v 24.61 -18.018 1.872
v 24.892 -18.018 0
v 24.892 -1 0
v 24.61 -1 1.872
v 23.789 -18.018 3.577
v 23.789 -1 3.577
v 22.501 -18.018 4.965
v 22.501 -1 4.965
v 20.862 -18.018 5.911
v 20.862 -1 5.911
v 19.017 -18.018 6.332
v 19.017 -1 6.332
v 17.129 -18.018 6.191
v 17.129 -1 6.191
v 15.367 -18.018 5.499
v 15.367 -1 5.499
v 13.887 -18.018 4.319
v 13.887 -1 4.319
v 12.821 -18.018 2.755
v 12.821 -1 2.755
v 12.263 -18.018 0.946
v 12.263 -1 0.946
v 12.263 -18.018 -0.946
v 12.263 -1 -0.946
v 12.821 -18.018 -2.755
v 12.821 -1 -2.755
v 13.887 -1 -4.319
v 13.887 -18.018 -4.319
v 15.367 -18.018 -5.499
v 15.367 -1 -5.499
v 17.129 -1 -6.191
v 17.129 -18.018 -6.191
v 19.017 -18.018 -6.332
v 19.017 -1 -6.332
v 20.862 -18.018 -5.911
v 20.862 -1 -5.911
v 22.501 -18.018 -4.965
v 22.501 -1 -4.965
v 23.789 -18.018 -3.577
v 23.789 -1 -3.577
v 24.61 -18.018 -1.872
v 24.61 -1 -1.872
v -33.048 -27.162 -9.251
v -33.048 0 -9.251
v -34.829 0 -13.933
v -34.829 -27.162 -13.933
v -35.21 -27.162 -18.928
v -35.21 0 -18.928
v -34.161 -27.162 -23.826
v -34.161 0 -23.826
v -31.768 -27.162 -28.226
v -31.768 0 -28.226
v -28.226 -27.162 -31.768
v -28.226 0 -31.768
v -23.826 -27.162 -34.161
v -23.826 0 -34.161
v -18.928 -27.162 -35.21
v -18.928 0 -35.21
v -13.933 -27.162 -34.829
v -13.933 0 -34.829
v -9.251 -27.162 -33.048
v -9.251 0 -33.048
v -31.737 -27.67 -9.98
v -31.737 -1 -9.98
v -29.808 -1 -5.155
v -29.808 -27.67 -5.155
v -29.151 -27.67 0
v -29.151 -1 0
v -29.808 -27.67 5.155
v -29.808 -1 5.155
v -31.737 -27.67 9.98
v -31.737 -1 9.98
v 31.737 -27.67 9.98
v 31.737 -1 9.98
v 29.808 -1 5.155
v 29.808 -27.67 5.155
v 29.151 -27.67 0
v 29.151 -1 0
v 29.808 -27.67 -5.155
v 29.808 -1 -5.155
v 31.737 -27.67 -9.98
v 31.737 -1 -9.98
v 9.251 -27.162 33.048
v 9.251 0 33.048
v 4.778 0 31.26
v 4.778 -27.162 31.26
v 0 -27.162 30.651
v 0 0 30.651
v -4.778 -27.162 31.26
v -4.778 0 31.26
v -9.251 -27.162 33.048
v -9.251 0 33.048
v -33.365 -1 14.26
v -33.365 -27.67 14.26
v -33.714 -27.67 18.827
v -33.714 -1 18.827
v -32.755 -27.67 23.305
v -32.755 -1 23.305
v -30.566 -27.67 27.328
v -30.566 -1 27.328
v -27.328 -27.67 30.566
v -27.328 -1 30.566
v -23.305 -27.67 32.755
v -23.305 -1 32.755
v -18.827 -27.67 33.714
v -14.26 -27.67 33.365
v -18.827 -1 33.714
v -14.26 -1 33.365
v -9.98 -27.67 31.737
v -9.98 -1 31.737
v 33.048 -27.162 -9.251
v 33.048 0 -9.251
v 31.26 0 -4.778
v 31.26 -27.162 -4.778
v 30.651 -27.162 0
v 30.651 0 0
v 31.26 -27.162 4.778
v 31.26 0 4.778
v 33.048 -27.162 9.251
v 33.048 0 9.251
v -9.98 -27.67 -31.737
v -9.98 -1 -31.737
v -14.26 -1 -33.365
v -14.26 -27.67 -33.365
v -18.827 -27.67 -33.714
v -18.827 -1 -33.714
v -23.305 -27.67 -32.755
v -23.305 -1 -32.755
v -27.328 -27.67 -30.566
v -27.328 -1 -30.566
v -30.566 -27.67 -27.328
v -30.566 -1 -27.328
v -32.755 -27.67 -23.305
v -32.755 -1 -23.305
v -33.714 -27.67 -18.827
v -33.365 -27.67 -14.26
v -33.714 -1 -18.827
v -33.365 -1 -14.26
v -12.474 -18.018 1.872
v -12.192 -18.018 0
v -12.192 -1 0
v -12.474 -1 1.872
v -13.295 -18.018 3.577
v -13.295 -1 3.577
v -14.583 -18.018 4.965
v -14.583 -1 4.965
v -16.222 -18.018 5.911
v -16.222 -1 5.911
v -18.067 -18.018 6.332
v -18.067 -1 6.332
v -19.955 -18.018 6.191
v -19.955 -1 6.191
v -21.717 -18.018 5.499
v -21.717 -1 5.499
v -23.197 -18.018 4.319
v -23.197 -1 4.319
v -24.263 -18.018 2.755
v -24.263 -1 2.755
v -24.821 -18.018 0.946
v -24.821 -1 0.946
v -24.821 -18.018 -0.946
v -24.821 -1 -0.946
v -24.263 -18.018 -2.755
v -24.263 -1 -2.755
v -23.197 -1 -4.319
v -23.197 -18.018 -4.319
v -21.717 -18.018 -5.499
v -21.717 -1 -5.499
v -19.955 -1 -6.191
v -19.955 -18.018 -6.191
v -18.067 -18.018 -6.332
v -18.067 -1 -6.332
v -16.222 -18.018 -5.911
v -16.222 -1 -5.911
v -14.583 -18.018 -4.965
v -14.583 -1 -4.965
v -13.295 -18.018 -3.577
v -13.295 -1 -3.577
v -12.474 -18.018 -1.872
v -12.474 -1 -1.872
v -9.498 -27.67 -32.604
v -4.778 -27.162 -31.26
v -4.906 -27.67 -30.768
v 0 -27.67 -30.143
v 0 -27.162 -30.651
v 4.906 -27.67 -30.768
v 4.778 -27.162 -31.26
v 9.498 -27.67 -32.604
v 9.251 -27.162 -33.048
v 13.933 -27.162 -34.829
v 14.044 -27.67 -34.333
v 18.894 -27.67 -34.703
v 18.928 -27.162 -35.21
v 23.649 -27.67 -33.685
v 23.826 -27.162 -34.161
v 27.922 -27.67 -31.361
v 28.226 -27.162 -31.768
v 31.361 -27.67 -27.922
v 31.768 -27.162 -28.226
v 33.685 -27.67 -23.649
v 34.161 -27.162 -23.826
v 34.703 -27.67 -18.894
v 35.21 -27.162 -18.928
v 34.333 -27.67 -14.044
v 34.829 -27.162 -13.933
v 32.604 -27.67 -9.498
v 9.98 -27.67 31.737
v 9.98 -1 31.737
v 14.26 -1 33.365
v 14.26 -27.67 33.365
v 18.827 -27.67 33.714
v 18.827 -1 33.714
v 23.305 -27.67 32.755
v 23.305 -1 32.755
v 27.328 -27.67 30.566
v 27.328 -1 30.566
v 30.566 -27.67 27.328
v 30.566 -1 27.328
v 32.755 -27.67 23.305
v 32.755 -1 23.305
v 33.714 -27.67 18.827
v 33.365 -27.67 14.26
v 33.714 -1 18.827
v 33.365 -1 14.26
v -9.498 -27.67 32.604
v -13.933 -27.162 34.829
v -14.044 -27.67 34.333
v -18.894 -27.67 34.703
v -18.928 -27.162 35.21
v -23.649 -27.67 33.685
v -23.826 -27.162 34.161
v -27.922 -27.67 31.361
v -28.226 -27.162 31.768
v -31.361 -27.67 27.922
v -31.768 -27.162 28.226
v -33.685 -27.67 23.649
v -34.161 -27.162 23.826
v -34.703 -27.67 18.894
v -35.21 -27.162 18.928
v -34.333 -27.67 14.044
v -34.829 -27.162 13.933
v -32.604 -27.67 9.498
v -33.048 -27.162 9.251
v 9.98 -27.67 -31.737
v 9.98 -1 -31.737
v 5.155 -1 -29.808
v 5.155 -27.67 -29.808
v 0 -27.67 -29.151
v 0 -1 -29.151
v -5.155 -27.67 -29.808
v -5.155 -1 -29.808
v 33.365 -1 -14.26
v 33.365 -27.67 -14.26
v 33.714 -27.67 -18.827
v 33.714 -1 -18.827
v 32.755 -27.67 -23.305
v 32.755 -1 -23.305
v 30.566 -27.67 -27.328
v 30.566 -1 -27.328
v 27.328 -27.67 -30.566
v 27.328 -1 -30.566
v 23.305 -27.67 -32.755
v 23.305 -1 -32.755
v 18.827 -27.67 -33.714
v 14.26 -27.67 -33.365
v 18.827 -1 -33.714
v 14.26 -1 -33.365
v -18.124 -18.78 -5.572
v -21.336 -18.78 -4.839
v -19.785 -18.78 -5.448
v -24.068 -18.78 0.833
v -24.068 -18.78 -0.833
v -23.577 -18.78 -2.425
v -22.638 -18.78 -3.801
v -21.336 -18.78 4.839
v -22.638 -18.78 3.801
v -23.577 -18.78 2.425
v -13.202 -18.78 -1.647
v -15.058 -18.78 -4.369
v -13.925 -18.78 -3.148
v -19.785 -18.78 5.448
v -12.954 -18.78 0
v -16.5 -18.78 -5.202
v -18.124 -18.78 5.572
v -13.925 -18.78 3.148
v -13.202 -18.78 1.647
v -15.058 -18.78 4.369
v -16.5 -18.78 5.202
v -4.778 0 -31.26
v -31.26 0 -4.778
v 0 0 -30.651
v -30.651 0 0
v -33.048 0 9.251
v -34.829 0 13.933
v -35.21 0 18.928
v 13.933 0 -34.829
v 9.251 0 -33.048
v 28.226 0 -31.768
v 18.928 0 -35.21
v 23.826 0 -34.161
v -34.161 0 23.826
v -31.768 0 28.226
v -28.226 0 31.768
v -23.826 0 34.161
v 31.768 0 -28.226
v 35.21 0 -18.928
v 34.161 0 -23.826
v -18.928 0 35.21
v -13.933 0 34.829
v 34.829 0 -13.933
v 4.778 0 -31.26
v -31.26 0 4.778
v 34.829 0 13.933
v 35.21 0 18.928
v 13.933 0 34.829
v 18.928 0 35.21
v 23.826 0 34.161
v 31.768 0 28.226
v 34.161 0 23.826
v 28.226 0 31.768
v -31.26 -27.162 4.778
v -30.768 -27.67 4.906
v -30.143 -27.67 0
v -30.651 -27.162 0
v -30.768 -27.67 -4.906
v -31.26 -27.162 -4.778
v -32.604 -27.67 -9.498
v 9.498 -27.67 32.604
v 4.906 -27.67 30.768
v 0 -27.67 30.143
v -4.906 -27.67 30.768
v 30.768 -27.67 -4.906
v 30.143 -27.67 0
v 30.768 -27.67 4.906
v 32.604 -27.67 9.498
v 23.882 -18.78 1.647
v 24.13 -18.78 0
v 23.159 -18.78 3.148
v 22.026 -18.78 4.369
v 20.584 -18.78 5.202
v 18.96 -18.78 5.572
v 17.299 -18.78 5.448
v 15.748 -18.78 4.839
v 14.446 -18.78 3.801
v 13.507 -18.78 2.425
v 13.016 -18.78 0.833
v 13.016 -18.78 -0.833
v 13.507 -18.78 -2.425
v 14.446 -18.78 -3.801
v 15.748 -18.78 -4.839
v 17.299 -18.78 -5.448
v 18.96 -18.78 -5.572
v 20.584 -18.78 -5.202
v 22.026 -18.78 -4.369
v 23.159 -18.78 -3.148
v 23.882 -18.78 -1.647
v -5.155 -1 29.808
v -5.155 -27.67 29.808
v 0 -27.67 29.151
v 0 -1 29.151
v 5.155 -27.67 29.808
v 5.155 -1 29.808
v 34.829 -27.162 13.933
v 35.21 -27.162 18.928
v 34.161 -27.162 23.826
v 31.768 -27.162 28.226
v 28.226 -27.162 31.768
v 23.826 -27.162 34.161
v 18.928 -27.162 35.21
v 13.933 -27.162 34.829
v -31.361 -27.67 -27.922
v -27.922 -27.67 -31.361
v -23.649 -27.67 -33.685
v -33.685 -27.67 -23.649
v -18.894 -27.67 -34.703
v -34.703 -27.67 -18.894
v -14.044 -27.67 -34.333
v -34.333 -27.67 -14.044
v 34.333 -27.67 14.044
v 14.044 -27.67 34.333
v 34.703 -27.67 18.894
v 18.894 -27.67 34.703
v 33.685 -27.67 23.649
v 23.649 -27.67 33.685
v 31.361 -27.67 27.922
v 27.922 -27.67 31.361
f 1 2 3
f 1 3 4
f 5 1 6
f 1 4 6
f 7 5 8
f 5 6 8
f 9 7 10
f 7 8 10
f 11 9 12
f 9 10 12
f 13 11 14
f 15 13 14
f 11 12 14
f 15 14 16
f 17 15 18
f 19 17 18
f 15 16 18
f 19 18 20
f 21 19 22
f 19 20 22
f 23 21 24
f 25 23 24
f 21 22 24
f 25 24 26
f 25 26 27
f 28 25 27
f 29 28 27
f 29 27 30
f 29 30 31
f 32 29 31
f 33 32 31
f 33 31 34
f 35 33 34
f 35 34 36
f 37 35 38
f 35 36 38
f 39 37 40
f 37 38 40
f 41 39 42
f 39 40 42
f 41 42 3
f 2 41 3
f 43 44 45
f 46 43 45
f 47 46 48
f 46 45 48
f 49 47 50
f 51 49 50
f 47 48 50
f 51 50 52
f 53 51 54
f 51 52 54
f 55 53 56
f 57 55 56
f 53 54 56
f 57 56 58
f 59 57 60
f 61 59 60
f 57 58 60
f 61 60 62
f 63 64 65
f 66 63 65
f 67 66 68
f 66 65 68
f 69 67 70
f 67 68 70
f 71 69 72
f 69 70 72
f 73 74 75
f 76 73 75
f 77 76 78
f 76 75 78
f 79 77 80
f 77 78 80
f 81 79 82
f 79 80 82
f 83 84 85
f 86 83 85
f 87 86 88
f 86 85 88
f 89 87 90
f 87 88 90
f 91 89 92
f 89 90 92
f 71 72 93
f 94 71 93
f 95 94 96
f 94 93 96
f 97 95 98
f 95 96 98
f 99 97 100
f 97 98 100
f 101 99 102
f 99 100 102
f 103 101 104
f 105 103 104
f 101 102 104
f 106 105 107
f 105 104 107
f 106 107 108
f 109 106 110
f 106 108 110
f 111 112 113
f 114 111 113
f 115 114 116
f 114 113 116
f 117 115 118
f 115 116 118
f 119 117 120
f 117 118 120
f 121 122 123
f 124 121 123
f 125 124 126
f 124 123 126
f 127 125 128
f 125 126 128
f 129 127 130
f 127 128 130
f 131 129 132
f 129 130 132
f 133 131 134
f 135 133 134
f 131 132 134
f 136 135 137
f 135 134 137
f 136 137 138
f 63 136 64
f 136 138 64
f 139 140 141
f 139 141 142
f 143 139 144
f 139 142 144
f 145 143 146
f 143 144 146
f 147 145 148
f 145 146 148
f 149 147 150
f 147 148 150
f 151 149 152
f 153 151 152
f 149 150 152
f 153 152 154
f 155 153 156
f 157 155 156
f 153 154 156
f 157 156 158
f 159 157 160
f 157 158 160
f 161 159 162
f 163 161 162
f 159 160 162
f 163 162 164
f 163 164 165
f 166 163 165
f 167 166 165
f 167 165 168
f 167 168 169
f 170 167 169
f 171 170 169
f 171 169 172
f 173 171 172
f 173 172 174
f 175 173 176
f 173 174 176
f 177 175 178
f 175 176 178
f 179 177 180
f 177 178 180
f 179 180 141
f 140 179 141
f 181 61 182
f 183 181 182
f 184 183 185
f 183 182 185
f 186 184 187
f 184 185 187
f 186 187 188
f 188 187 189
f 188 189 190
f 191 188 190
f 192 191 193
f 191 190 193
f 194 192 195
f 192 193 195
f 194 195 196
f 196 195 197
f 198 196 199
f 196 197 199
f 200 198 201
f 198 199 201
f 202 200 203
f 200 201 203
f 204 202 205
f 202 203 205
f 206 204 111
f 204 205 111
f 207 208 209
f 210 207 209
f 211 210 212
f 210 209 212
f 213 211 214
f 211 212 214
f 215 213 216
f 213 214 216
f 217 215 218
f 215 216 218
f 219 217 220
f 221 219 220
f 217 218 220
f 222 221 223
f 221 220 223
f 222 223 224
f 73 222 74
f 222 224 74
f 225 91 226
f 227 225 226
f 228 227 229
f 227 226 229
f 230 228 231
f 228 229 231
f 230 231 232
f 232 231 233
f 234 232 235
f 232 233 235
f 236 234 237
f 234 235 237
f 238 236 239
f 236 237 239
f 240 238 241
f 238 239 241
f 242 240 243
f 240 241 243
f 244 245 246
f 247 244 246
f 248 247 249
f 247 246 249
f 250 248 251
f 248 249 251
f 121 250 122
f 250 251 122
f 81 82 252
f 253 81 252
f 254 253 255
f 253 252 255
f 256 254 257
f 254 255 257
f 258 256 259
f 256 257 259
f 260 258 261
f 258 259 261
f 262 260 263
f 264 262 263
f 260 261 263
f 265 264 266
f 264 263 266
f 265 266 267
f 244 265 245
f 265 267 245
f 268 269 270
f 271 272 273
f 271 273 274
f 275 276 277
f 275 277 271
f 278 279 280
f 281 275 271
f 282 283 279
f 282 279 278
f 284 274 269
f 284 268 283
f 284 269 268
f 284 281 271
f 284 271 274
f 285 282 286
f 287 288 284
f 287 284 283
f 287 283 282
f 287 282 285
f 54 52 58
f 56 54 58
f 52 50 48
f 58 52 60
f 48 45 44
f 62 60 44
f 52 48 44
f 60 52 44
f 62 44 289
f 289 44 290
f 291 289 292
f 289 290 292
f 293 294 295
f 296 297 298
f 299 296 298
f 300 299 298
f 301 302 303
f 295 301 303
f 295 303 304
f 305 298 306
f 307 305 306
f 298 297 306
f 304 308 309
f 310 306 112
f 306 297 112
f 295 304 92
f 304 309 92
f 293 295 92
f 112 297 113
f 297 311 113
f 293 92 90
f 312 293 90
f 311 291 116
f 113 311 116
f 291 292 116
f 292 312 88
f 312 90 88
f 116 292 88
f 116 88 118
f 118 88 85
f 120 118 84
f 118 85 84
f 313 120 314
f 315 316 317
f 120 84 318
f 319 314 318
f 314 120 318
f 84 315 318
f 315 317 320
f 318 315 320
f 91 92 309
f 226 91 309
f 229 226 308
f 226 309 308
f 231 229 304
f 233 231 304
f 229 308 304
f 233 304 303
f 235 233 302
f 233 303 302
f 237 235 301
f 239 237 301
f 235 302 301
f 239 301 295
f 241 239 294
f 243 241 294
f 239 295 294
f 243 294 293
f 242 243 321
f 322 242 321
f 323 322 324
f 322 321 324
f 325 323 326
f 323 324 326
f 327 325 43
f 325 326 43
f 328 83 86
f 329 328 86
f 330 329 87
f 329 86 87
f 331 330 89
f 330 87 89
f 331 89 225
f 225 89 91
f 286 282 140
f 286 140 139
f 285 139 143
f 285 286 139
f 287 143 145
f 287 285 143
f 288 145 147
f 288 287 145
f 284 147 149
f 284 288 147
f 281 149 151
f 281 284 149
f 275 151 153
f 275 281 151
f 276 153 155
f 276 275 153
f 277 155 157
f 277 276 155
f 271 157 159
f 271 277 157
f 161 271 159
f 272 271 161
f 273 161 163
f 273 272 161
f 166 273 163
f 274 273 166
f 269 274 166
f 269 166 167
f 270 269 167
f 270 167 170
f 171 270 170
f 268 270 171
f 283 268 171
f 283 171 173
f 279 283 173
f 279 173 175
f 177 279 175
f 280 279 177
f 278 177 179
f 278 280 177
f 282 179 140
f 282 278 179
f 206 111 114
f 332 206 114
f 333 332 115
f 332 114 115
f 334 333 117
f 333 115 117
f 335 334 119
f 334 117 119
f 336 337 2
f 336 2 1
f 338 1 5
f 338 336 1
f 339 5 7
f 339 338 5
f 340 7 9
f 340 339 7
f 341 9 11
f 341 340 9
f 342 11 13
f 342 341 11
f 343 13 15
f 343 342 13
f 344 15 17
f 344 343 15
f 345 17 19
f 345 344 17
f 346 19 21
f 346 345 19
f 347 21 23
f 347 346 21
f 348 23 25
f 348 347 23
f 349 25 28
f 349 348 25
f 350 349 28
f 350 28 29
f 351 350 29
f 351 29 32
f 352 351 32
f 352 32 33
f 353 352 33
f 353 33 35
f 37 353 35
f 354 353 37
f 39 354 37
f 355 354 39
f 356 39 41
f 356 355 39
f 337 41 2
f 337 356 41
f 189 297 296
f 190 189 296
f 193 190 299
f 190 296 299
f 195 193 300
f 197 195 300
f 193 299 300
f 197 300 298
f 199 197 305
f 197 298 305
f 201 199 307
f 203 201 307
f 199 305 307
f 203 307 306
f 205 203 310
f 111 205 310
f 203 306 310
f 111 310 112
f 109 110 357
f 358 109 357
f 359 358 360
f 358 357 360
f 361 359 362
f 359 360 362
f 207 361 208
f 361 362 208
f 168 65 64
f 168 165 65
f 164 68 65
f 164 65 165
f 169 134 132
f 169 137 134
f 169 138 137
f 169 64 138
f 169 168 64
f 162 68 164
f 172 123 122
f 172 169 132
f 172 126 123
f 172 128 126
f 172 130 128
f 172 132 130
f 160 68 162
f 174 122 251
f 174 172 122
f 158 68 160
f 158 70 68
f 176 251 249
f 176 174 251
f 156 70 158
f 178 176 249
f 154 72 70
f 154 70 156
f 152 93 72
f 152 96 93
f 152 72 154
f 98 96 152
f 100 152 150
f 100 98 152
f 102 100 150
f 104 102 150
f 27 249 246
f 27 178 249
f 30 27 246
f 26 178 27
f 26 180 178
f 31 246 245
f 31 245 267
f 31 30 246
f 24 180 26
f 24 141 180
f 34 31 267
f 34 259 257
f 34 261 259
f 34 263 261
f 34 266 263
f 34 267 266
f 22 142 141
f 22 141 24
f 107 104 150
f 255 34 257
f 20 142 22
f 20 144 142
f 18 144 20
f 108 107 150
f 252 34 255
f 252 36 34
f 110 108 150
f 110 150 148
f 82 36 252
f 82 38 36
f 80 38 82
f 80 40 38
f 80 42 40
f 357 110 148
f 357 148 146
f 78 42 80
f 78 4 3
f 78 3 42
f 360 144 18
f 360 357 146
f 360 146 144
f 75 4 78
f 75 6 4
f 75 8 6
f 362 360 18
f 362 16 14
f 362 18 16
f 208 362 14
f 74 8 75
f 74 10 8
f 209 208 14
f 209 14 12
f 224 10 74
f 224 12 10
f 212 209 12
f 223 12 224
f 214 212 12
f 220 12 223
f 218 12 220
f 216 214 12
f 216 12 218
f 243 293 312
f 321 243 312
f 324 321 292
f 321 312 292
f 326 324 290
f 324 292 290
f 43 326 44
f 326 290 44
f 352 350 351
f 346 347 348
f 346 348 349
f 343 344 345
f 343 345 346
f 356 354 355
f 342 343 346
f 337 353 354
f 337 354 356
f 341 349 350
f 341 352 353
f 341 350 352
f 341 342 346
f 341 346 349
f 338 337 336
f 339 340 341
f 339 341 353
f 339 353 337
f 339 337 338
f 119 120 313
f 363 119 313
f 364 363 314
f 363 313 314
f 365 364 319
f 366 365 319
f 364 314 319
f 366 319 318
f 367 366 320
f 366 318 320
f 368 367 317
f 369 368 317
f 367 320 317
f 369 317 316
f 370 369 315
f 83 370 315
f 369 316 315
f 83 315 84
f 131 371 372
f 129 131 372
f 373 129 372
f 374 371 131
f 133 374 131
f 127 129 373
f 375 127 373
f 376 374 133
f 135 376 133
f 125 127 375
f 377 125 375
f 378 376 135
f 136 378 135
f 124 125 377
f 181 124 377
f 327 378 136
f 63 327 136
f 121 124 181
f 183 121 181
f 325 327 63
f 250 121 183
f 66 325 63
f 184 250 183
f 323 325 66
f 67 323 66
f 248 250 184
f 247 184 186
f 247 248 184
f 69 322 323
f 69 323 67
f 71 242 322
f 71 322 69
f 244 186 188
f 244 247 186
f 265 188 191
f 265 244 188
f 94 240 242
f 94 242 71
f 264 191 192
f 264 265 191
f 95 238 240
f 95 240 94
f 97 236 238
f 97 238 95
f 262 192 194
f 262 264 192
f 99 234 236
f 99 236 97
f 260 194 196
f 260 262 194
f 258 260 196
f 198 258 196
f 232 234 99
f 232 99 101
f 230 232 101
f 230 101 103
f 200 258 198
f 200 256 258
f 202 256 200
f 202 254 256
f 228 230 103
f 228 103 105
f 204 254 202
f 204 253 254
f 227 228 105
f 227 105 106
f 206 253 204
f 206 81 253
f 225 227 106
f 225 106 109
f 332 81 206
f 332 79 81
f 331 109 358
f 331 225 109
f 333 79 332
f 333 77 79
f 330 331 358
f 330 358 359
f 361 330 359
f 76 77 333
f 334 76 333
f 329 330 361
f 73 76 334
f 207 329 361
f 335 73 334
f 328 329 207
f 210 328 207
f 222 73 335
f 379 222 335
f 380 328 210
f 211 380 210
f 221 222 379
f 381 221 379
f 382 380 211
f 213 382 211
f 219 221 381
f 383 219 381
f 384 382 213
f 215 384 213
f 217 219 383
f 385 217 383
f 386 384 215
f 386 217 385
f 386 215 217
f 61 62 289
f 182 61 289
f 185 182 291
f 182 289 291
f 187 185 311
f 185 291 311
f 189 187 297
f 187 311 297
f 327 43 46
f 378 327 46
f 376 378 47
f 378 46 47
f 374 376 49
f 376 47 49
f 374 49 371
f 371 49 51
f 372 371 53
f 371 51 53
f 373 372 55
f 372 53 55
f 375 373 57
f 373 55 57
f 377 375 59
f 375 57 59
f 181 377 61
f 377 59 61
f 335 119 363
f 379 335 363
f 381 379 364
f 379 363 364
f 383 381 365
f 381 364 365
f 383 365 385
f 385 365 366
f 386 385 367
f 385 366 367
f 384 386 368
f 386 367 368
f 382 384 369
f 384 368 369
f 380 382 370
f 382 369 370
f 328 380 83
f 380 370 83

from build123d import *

# Parameters (mm, degrees)
F1_DEPTH = 1
F3_DEPTH = 26.67
F4_R     = 6.35
F5_DEPTH = 17.78
F6_SIZE  = 0.762
F7_SIZE  = 0.508


with BuildPart() as f1:
    # F0 (on Front) → F1 (new body)
    with BuildSketch(Plane.XZ):
        with BuildLine():
            ThreePointArc((-9.251368, 33.047819), (-30.124369, 30.124369), (-33.047819, 9.251368))
            ThreePointArc((-33.047819, 9.251368), (-30.650587, 0), (-33.047819, -9.251368))
            ThreePointArc((-33.047819, -9.251368), (-30.124369, -30.124369), (-9.251368, -33.047819))
            ThreePointArc((-9.251368, -33.047819), (0, -30.650587), (9.251368, -33.047819))
            ThreePointArc((9.251368, -33.047819), (30.124369, -30.124369), (33.047819, -9.251368))
            ThreePointArc((33.047819, -9.251368), (30.650587, 0), (33.047819, 9.251368))
            ThreePointArc((33.047819, 9.251368), (30.124369, 30.124369), (9.251368, 33.047819))
            ThreePointArc((9.251368, 33.047819), (0, 30.650587), (-9.251368, 33.047819))
        make_face()
    extrude(amount=F1_DEPTH)

    # F2 (on face) → F3 (join)
    with BuildSketch(Plane.XZ.offset(1)):
        with BuildLine():
            ThreePointArc((-9.251368, 33.047819), (-30.124369, 30.124369), (-33.047819, 9.251368))
            ThreePointArc((-33.047819, 9.251368), (-30.650587, 0), (-33.047819, -9.251368))
            ThreePointArc((-33.047819, -9.251368), (-30.124369, -30.124369), (-9.251368, -33.047819))
            ThreePointArc((-9.251368, -33.047819), (0, -30.650587), (9.251368, -33.047819))
            ThreePointArc((9.251368, -33.047819), (30.124369, -30.124369), (33.047819, -9.251368))
            ThreePointArc((33.047819, -9.251368), (30.650587, 0), (33.047819, 9.251368))
            ThreePointArc((33.047819, 9.251368), (30.124369, 30.124369), (9.251368, 33.047819))
            ThreePointArc((9.251368, 33.047819), (0, 30.650587), (-9.251368, 33.047819))
        make_face()
        with BuildLine():
            ThreePointArc((-9.979822, 31.736577), (0, 29.150587), (9.979822, 31.736577))
            ThreePointArc((9.979822, 31.736577), (29.063708, 29.063708), (31.736577, 9.979822))
            ThreePointArc((31.736577, 9.979822), (29.150587, 0), (31.736577, -9.979822))
            ThreePointArc((31.736577, -9.979822), (29.063708, -29.063708), (9.979822, -31.736577))
            ThreePointArc((9.979822, -31.736577), (0, -29.150587), (-9.979822, -31.736577))
            ThreePointArc((-9.979822, -31.736577), (-29.063708, -29.063708), (-31.736577, -9.979822))
            ThreePointArc((-31.736577, -9.979822), (-29.150587, 0), (-31.736577, 9.979822))
            ThreePointArc((-31.736577, 9.979822), (-29.063708, 29.063708), (-9.979822, 31.736577))
        make_face(mode=Mode.SUBTRACT)
    extrude(amount=F3_DEPTH)

    # F4 (on face) → F5 (join)
    with BuildSketch(Plane.XZ.offset(1)):
        with Locations((-18.542, 0)):
            Circle(F4_R)
        with Locations((18.542, 0)):
            Circle(F4_R)
    extrude(amount=F5_DEPTH)

    # F6
    f6_edges = [f1.edges().sort_by_distance(p)[0] for p in [
        (12.192, -18.78, 0),
        (-24.892, -18.78, 0),
    ]]
    chamfer(f6_edges, length=F6_SIZE)

    # F7
    f7_edges = [f1.edges().sort_by_distance(p)[0] for p in [
        (-30.124369, -27.67, 30.124369),
    ]]
    chamfer(f7_edges, length=F7_SIZE)


solid = f1.part
